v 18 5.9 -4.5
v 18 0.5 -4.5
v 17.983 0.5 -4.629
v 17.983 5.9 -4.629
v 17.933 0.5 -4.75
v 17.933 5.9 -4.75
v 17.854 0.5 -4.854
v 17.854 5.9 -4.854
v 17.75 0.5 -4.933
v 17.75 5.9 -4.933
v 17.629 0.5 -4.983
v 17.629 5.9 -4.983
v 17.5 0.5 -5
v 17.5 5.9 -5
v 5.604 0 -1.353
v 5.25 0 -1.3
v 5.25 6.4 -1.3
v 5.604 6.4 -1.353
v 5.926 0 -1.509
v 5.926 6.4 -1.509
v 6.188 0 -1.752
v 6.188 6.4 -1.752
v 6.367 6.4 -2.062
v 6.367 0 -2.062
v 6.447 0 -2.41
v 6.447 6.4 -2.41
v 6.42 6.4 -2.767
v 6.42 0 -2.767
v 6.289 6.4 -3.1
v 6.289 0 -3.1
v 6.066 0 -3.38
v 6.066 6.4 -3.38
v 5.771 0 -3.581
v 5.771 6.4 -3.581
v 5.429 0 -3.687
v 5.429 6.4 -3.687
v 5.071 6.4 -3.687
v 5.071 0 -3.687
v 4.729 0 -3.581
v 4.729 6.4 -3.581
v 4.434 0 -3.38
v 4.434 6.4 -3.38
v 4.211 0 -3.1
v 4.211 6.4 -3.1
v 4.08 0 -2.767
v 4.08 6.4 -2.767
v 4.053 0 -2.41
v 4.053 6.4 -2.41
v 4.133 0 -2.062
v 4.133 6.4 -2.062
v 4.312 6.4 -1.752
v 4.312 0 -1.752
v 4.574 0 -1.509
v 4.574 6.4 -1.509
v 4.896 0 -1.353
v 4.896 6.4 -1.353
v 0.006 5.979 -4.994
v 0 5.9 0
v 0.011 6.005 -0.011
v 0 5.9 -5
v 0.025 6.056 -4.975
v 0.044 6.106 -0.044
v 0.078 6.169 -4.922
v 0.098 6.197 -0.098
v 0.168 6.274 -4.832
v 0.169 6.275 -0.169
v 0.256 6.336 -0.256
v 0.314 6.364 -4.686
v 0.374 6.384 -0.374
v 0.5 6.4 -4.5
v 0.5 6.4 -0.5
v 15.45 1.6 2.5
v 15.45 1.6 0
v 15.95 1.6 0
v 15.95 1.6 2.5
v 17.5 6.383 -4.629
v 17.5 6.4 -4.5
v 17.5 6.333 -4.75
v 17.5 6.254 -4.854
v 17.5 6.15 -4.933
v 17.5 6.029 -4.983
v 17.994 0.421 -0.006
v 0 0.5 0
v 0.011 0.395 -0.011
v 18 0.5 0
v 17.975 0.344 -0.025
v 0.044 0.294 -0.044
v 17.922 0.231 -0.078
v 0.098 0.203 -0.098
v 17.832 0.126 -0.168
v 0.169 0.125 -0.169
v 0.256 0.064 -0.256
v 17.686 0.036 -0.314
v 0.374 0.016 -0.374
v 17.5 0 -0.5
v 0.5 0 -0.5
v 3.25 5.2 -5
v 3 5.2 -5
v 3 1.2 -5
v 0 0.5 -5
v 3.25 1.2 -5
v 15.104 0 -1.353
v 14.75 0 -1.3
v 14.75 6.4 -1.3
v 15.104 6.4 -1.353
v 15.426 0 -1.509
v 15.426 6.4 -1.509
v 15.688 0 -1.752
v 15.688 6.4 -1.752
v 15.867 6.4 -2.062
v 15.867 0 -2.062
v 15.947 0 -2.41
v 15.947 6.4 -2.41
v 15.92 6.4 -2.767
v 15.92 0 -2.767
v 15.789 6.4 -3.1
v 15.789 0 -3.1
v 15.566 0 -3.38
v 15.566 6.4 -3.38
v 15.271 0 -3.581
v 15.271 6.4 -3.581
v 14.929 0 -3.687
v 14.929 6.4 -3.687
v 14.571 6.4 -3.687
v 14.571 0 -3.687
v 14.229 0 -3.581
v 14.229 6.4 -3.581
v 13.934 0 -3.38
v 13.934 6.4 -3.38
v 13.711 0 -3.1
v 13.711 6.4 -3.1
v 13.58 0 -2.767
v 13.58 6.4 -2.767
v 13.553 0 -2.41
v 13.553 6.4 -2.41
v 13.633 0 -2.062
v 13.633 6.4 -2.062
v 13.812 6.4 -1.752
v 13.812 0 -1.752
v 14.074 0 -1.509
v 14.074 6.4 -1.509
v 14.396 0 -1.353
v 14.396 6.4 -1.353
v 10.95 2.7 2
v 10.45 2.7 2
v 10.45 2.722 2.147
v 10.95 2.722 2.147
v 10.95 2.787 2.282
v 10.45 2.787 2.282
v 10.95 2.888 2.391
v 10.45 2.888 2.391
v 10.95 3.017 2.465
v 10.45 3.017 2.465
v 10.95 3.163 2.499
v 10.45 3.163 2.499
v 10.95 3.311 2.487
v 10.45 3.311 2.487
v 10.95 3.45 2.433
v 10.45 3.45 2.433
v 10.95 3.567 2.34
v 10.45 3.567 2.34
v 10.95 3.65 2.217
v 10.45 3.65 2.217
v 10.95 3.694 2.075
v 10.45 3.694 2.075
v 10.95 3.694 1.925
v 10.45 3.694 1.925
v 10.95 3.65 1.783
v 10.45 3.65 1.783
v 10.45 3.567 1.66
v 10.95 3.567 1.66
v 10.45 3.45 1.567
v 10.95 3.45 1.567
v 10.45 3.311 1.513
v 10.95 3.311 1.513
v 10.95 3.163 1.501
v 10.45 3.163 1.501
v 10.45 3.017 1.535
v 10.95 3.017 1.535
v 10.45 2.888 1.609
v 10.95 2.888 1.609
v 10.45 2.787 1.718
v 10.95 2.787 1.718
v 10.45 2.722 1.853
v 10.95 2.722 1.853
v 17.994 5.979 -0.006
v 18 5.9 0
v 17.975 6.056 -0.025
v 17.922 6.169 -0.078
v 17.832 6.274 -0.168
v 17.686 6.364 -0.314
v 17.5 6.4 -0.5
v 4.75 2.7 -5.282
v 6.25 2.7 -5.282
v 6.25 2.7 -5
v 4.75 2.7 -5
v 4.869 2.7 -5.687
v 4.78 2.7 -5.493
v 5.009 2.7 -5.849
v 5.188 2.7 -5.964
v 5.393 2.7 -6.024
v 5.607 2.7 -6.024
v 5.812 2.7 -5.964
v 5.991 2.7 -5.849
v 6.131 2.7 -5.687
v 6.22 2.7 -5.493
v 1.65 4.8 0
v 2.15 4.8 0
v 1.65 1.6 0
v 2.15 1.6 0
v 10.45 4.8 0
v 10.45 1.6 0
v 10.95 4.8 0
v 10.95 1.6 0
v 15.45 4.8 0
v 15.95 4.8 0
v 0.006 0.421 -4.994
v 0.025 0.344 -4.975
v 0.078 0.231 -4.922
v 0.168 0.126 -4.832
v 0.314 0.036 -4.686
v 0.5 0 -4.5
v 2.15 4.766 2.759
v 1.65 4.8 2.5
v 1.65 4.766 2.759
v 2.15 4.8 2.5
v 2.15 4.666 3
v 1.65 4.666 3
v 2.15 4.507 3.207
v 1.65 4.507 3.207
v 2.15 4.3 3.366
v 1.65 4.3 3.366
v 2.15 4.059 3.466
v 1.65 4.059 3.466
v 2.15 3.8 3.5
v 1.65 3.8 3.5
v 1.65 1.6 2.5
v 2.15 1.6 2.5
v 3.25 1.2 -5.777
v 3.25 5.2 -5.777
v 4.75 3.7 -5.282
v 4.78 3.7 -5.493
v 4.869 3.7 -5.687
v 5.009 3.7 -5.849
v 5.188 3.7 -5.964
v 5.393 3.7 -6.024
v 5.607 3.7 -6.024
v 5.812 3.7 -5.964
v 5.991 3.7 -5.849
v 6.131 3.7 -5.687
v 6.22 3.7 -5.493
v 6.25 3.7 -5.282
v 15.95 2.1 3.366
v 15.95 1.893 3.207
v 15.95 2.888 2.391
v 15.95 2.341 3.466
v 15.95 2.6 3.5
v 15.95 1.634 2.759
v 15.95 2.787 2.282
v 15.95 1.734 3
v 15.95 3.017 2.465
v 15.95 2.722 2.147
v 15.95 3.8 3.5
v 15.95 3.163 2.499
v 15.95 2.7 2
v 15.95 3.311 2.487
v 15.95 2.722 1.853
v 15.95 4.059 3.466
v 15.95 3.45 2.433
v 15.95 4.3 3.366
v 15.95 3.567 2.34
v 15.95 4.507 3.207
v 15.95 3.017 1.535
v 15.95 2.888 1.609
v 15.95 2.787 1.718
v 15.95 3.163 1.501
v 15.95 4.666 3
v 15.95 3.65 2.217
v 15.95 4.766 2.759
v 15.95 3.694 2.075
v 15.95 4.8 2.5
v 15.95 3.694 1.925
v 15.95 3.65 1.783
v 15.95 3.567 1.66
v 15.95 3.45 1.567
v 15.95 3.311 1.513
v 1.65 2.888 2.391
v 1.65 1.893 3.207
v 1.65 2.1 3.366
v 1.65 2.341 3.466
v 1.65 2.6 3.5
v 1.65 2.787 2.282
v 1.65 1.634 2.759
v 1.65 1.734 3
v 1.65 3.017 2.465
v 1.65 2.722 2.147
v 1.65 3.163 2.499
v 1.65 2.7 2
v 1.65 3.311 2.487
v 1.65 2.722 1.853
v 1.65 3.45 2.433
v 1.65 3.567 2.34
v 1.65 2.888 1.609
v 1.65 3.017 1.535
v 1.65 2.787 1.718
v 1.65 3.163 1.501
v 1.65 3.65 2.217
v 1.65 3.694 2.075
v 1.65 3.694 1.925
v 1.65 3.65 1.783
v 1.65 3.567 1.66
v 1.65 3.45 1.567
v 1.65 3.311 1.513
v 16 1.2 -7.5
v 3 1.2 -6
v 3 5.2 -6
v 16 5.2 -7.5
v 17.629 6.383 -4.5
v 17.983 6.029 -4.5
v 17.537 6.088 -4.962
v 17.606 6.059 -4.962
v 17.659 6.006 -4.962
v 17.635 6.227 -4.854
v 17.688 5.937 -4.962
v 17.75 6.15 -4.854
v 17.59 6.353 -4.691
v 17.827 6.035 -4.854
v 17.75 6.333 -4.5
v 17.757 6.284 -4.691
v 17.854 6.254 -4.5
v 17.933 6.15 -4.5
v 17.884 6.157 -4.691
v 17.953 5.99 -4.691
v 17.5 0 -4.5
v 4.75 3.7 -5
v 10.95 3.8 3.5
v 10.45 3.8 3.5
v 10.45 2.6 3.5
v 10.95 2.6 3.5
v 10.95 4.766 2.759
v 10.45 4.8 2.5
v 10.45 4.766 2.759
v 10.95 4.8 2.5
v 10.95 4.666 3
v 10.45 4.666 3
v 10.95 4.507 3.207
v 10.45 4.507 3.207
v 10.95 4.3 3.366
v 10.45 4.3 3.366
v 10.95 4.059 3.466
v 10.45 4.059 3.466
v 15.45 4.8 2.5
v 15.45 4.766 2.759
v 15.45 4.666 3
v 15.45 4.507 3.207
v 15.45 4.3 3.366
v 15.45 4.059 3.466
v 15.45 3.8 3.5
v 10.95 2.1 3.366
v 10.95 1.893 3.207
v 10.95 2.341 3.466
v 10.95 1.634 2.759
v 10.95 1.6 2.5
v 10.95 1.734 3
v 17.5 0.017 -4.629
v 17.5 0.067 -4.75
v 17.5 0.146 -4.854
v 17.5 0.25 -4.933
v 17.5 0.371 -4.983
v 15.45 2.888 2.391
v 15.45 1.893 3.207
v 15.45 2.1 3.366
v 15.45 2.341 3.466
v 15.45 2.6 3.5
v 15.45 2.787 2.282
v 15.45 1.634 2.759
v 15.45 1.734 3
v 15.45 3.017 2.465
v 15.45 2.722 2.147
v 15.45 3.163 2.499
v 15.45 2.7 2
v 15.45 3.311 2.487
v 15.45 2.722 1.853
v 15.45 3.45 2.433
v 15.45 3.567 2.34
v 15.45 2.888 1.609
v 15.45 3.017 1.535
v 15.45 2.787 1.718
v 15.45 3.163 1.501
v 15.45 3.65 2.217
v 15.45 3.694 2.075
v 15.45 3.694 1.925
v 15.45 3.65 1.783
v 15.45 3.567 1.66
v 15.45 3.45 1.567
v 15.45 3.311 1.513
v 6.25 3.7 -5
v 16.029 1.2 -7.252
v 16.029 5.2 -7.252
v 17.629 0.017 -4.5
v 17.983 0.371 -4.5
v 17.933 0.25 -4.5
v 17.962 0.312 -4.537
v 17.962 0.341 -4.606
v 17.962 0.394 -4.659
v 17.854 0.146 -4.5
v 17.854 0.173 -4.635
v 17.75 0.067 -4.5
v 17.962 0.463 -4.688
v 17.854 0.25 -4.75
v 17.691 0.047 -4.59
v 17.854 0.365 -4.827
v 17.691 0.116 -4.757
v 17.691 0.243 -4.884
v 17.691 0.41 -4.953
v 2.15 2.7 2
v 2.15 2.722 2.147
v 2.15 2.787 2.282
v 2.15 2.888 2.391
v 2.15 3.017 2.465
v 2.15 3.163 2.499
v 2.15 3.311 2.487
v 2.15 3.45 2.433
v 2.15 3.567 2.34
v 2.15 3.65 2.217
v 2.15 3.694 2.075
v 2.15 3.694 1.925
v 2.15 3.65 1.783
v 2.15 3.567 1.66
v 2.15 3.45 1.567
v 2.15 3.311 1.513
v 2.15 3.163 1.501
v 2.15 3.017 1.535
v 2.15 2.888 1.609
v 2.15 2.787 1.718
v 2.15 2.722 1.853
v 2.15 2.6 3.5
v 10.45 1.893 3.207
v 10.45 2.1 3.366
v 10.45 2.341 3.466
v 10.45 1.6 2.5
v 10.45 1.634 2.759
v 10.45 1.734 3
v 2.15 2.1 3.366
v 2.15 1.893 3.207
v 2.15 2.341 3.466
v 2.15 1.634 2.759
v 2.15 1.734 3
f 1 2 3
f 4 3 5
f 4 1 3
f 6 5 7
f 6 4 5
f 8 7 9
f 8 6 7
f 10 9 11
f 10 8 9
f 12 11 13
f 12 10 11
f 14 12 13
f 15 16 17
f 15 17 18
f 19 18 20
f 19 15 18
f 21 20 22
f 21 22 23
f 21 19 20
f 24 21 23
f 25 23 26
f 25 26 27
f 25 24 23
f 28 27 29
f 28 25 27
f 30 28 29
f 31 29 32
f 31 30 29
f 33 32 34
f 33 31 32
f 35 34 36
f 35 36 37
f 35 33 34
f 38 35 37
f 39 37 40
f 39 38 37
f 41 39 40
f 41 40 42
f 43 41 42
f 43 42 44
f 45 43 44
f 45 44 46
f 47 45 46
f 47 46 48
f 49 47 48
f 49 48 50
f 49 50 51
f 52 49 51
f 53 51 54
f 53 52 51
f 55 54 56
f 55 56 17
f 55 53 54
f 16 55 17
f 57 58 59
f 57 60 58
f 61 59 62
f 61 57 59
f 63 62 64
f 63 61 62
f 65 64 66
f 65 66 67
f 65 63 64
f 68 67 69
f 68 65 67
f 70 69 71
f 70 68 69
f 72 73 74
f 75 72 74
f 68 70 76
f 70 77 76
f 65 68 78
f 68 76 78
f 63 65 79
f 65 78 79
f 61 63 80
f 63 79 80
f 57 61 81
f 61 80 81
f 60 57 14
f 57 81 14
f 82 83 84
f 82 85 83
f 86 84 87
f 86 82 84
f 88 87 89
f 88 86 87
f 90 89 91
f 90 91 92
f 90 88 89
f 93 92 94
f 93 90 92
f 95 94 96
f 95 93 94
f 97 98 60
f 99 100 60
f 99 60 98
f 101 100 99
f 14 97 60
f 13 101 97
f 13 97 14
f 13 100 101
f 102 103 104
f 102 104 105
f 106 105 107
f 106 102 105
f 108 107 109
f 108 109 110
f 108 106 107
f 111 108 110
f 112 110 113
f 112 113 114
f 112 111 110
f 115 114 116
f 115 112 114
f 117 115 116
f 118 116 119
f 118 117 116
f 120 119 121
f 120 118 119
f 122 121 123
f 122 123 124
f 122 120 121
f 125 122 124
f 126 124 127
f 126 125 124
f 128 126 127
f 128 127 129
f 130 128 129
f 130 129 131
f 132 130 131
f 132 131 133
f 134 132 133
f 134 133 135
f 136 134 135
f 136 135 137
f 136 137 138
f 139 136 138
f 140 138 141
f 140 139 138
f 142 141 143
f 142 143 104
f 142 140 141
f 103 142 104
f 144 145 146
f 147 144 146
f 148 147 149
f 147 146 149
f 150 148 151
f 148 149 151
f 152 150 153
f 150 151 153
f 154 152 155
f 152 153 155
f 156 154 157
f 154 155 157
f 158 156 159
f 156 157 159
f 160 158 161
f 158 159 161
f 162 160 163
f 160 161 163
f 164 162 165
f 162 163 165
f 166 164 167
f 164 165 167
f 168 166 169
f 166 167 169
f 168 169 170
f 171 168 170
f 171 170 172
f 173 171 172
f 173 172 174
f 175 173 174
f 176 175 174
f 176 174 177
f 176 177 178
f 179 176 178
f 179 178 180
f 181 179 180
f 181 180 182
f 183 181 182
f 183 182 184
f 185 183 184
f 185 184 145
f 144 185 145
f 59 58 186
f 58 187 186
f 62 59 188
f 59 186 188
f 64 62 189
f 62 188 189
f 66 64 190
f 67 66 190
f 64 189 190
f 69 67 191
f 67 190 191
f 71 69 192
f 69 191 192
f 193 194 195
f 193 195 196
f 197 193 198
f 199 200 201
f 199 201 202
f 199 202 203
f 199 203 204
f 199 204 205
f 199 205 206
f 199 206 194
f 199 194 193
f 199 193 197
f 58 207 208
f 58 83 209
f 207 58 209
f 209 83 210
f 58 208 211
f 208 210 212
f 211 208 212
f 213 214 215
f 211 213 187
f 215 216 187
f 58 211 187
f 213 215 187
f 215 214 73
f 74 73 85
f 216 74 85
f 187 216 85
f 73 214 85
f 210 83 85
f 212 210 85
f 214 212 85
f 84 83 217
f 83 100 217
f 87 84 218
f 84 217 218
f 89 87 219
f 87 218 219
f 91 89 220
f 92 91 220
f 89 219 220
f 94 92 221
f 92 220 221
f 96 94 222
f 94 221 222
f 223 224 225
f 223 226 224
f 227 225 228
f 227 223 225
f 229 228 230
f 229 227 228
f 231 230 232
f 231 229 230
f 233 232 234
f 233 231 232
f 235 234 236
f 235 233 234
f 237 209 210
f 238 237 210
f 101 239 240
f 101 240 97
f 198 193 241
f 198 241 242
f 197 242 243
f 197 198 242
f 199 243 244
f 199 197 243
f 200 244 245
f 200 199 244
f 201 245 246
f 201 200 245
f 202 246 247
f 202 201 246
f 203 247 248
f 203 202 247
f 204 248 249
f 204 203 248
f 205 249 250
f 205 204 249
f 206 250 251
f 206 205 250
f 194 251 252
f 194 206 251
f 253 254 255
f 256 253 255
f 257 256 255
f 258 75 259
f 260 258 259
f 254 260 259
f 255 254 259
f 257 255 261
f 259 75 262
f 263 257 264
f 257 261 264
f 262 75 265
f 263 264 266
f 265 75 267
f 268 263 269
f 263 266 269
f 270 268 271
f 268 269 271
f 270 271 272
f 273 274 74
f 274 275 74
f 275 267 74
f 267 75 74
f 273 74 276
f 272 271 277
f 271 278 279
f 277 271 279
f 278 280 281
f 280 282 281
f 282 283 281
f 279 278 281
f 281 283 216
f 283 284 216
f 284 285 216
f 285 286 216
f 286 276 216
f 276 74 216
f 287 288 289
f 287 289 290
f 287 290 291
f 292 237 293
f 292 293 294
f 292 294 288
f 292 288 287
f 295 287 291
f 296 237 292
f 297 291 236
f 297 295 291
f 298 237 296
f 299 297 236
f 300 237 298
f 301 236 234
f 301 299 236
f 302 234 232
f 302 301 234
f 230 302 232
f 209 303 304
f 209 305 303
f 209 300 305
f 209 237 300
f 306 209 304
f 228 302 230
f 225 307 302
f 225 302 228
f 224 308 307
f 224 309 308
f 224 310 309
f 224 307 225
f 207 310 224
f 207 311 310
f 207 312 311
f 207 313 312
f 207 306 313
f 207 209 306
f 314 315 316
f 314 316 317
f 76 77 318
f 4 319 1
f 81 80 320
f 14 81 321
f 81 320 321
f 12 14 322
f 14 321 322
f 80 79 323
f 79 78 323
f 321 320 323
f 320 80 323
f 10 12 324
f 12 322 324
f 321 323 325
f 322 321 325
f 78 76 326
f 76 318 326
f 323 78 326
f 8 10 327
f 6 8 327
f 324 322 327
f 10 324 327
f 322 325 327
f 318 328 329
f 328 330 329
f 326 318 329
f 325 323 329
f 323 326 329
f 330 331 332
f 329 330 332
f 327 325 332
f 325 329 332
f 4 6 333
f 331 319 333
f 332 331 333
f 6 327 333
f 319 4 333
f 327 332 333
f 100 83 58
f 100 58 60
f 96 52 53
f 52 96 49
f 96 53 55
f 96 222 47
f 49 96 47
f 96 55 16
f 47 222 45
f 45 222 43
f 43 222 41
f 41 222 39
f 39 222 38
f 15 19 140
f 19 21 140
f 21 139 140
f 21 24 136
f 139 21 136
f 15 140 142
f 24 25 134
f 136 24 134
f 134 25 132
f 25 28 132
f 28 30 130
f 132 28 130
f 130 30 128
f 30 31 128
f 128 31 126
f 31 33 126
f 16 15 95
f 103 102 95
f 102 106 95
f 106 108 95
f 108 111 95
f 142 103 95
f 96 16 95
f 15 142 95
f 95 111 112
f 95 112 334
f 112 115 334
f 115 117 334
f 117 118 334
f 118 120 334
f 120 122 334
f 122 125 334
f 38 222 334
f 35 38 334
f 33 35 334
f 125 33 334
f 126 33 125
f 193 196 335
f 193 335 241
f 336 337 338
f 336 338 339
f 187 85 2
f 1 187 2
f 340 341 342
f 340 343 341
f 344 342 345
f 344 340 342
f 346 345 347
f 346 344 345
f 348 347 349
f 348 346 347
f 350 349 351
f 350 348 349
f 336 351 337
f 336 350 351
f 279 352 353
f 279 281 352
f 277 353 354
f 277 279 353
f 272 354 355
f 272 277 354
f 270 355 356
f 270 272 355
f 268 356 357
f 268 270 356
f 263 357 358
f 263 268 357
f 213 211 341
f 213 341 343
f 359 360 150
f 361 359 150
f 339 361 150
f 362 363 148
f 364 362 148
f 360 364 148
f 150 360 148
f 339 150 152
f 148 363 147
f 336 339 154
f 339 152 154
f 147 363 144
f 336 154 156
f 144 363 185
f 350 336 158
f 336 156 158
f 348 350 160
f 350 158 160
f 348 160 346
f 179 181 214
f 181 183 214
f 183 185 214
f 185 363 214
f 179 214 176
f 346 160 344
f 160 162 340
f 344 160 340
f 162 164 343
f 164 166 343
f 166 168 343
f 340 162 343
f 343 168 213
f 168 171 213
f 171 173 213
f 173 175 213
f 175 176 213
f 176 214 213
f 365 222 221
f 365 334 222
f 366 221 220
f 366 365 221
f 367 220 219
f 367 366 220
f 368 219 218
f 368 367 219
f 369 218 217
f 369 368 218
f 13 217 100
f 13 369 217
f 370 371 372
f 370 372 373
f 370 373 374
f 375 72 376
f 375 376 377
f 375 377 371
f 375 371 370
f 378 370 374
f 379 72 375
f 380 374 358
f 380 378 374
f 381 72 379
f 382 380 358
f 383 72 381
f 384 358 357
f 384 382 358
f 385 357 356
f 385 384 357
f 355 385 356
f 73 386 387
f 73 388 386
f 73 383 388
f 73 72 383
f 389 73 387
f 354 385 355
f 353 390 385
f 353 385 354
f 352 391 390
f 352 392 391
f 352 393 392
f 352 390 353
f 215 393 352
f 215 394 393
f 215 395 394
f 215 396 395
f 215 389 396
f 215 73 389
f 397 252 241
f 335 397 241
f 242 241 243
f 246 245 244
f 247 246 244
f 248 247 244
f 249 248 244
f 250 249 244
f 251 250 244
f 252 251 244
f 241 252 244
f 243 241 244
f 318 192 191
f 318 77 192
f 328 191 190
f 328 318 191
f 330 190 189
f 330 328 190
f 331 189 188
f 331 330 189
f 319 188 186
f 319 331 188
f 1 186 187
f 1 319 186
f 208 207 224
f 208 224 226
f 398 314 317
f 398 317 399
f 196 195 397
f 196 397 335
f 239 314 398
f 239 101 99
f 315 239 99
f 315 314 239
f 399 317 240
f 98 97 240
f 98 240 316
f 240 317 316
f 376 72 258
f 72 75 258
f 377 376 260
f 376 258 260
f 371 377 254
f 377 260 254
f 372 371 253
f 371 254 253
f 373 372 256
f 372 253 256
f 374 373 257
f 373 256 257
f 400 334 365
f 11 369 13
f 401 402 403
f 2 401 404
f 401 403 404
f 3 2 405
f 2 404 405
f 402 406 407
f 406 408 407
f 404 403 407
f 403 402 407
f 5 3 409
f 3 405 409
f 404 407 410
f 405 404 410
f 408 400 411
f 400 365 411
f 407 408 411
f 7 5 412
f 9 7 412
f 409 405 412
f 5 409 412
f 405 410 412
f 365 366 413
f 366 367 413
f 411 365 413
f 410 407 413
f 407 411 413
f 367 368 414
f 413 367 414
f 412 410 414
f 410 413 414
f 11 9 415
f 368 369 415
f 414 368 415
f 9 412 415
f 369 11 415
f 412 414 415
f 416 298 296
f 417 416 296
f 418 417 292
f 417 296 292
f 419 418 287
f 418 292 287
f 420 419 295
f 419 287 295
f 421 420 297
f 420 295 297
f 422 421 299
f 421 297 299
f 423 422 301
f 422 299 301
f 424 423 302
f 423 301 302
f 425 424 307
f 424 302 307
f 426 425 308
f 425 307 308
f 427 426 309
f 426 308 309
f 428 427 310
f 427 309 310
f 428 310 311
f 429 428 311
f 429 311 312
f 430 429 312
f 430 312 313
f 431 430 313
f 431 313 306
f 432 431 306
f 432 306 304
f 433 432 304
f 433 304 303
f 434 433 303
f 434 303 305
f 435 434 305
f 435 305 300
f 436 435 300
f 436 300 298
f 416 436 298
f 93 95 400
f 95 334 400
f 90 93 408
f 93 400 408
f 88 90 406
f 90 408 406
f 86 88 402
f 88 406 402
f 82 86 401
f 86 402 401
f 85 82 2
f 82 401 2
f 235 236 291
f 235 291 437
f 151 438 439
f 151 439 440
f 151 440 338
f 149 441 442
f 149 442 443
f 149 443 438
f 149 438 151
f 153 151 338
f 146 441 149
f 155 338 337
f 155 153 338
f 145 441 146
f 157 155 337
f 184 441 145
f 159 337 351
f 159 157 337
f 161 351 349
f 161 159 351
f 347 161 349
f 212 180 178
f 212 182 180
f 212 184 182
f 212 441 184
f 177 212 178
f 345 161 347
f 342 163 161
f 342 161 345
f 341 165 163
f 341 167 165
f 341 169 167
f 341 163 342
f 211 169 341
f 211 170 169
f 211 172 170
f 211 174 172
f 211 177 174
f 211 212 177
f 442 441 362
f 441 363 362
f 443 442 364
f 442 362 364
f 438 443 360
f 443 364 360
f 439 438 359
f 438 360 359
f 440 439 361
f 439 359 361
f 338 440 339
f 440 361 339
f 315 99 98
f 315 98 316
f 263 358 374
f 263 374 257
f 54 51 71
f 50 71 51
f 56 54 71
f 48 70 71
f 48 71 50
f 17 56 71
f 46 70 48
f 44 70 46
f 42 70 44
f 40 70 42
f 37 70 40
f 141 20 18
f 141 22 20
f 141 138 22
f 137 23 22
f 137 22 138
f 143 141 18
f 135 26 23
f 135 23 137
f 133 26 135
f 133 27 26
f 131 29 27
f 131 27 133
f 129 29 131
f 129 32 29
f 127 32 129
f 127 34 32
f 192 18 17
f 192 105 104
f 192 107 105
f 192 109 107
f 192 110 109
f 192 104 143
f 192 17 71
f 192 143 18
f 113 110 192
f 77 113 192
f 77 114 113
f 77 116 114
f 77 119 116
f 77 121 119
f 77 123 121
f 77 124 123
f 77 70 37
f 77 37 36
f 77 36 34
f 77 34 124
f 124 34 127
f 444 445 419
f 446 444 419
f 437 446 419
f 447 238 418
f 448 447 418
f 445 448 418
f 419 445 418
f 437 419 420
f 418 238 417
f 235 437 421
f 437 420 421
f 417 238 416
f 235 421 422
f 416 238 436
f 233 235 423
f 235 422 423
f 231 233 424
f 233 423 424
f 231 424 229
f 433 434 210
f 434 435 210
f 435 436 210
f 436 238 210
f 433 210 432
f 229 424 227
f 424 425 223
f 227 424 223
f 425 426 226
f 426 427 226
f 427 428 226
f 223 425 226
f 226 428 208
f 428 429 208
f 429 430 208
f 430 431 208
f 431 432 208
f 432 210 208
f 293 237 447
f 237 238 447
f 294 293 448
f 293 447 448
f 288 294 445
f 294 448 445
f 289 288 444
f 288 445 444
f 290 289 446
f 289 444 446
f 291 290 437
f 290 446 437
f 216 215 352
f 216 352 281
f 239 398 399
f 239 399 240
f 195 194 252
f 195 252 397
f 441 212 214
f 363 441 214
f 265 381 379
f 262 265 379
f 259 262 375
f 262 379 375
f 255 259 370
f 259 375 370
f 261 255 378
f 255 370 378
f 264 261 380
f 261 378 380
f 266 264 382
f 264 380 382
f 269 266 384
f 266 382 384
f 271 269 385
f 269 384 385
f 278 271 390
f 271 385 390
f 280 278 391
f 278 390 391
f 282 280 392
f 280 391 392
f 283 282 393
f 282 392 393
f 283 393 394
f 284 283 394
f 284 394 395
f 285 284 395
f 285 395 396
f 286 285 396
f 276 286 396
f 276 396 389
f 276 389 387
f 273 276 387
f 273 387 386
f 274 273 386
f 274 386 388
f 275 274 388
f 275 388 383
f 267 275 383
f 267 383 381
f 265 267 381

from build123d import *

# Parameters (mm, degrees)
SKETCH1_W                = 18
SKETCH1_H                = 5
SKETCH1_R                = 1.2
BOSS_EXTRUDE1_DEPTH      = 6.4
SKETCH2_W                = 0.5
SKETCH2_H                = 3.2
BOSS_EXTRUDE2_DEPTH      = 3.5
SKETCH3_R                = 0.5
CUT_EXTRUDE1_DEPTH       = 19.256026402
FILLET1_R                = 1
FILLET2_R                = 0.5
EXTRUDE_THIN2_DEPTH      = 2
EXTRUDE_THIN2_DEPTH_BACK = 2
BOSS_EXTRUDE6_DEPTH      = 0.5
BOSS_EXTRUDE6_DEPTH_BACK = 0.5


with BuildPart() as part:
    # Sketch1 → Boss-Extrude1 (new body)
    with BuildSketch(Plane(origin=(0, 0, 0), x_dir=(1, 0, 0), z_dir=(0, 1, 0))):
        with Locations((9, 2.5)):
            Rectangle(SKETCH1_W, SKETCH1_H)
        with Locations(Location((5.25, 2.5, 0), (0, 0, 270))):
            Circle(SKETCH1_R, mode=Mode.SUBTRACT)
        with Locations(Location((14.75, 2.5, 0), (0, 0, 270))):
            Circle(SKETCH1_R, mode=Mode.SUBTRACT)
    extrude(amount=BOSS_EXTRUDE1_DEPTH)

    # Sketch2 → Boss-Extrude2 (add)
    with BuildSketch(Plane.XY):
        with Locations((15.7, 3.2)):
            Rectangle(SKETCH2_W, SKETCH2_H)
        with Locations((10.7, 3.2)):
            Rectangle(SKETCH2_W, SKETCH2_H)
        with Locations((1.9, 3.2)):
            Rectangle(SKETCH2_W, SKETCH2_H)
    extrude(amount=BOSS_EXTRUDE2_DEPTH)

    # Sketch3 → Cut-Extrude1 (cut, through all)
    with BuildSketch(Plane.ZY.offset(-1.65)):
        with Locations(Location((2, 3.2, 0), (0, 0, 270))):
            Circle(SKETCH3_R)
    extrude(amount=-CUT_EXTRUDE1_DEPTH, mode=Mode.SUBTRACT)

    # Fillet1
    fillet1_edges = [part.edges().sort_by_distance(p)[0] for p in [
        (15.7, 1.6, 3.5),
        (15.7, 4.8, 3.5),
        (10.7, 4.8, 3.5),
        (10.7, 1.6, 3.5),
        (1.9, 4.8, 3.5),
        (1.9, 1.6, 3.5),
    ]]
    fillet(fillet1_edges, radius=FILLET1_R)

    # Fillet2
    fillet2_edges = [part.edges().sort_by_distance(p)[0] for p in [
        (18, 6.4, -2.5),
        (9, 6.4, -5),
        (0, 6.4, -2.5),
        (9, 0, -5),
        (18, 0, -2.5),
        (9, 0, 0),
        (0, 0, -2.5),
        (9, 6.4, 0),
        (18, 3.2, -5),
    ]]
    fillet(fillet2_edges, radius=FILLET2_R)

    # Sketch4 → Extrude-Thin2 (add, two sides: drawn at the far end of the back side and taken through both)
    with BuildSketch(Plane(origin=(0, 3.2, 0), x_dir=(1, 0, 0), z_dir=(0, 1, 0)).offset(-EXTRUDE_THIN2_DEPTH_BACK)):
        Polygon((3, 5), (3, 6), (16, 7.5), (16.028656027, 7.251647766), (3.25, 5.777187455), (3.25, 5), align=None)
    extrude(amount=EXTRUDE_THIN2_DEPTH + EXTRUDE_THIN2_DEPTH_BACK)


with BuildPart() as body_2:
    # Sketch5 → Boss-Extrude6 (new, two sides: drawn at the far end of the back side and taken through both)
    with BuildSketch(Plane(origin=(0, 3.2, 0), x_dir=(1, 0, 0), z_dir=(0, 1, 0)).offset(-BOSS_EXTRUDE6_DEPTH_BACK)):
        with BuildLine():
            Line((4.75, 5), (4.75, 5.281826744))
            ThreePointArc((4.75, 5.281826744), (5.5, 6.031826744), (6.25, 5.281826744))
            Line((6.25, 5.281826744), (6.25, 5))
            Line((6.25, 5), (4.75, 5))
        make_face()
    extrude(amount=BOSS_EXTRUDE6_DEPTH + BOSS_EXTRUDE6_DEPTH_BACK)


solid = Compound([part.part, body_2.part])
